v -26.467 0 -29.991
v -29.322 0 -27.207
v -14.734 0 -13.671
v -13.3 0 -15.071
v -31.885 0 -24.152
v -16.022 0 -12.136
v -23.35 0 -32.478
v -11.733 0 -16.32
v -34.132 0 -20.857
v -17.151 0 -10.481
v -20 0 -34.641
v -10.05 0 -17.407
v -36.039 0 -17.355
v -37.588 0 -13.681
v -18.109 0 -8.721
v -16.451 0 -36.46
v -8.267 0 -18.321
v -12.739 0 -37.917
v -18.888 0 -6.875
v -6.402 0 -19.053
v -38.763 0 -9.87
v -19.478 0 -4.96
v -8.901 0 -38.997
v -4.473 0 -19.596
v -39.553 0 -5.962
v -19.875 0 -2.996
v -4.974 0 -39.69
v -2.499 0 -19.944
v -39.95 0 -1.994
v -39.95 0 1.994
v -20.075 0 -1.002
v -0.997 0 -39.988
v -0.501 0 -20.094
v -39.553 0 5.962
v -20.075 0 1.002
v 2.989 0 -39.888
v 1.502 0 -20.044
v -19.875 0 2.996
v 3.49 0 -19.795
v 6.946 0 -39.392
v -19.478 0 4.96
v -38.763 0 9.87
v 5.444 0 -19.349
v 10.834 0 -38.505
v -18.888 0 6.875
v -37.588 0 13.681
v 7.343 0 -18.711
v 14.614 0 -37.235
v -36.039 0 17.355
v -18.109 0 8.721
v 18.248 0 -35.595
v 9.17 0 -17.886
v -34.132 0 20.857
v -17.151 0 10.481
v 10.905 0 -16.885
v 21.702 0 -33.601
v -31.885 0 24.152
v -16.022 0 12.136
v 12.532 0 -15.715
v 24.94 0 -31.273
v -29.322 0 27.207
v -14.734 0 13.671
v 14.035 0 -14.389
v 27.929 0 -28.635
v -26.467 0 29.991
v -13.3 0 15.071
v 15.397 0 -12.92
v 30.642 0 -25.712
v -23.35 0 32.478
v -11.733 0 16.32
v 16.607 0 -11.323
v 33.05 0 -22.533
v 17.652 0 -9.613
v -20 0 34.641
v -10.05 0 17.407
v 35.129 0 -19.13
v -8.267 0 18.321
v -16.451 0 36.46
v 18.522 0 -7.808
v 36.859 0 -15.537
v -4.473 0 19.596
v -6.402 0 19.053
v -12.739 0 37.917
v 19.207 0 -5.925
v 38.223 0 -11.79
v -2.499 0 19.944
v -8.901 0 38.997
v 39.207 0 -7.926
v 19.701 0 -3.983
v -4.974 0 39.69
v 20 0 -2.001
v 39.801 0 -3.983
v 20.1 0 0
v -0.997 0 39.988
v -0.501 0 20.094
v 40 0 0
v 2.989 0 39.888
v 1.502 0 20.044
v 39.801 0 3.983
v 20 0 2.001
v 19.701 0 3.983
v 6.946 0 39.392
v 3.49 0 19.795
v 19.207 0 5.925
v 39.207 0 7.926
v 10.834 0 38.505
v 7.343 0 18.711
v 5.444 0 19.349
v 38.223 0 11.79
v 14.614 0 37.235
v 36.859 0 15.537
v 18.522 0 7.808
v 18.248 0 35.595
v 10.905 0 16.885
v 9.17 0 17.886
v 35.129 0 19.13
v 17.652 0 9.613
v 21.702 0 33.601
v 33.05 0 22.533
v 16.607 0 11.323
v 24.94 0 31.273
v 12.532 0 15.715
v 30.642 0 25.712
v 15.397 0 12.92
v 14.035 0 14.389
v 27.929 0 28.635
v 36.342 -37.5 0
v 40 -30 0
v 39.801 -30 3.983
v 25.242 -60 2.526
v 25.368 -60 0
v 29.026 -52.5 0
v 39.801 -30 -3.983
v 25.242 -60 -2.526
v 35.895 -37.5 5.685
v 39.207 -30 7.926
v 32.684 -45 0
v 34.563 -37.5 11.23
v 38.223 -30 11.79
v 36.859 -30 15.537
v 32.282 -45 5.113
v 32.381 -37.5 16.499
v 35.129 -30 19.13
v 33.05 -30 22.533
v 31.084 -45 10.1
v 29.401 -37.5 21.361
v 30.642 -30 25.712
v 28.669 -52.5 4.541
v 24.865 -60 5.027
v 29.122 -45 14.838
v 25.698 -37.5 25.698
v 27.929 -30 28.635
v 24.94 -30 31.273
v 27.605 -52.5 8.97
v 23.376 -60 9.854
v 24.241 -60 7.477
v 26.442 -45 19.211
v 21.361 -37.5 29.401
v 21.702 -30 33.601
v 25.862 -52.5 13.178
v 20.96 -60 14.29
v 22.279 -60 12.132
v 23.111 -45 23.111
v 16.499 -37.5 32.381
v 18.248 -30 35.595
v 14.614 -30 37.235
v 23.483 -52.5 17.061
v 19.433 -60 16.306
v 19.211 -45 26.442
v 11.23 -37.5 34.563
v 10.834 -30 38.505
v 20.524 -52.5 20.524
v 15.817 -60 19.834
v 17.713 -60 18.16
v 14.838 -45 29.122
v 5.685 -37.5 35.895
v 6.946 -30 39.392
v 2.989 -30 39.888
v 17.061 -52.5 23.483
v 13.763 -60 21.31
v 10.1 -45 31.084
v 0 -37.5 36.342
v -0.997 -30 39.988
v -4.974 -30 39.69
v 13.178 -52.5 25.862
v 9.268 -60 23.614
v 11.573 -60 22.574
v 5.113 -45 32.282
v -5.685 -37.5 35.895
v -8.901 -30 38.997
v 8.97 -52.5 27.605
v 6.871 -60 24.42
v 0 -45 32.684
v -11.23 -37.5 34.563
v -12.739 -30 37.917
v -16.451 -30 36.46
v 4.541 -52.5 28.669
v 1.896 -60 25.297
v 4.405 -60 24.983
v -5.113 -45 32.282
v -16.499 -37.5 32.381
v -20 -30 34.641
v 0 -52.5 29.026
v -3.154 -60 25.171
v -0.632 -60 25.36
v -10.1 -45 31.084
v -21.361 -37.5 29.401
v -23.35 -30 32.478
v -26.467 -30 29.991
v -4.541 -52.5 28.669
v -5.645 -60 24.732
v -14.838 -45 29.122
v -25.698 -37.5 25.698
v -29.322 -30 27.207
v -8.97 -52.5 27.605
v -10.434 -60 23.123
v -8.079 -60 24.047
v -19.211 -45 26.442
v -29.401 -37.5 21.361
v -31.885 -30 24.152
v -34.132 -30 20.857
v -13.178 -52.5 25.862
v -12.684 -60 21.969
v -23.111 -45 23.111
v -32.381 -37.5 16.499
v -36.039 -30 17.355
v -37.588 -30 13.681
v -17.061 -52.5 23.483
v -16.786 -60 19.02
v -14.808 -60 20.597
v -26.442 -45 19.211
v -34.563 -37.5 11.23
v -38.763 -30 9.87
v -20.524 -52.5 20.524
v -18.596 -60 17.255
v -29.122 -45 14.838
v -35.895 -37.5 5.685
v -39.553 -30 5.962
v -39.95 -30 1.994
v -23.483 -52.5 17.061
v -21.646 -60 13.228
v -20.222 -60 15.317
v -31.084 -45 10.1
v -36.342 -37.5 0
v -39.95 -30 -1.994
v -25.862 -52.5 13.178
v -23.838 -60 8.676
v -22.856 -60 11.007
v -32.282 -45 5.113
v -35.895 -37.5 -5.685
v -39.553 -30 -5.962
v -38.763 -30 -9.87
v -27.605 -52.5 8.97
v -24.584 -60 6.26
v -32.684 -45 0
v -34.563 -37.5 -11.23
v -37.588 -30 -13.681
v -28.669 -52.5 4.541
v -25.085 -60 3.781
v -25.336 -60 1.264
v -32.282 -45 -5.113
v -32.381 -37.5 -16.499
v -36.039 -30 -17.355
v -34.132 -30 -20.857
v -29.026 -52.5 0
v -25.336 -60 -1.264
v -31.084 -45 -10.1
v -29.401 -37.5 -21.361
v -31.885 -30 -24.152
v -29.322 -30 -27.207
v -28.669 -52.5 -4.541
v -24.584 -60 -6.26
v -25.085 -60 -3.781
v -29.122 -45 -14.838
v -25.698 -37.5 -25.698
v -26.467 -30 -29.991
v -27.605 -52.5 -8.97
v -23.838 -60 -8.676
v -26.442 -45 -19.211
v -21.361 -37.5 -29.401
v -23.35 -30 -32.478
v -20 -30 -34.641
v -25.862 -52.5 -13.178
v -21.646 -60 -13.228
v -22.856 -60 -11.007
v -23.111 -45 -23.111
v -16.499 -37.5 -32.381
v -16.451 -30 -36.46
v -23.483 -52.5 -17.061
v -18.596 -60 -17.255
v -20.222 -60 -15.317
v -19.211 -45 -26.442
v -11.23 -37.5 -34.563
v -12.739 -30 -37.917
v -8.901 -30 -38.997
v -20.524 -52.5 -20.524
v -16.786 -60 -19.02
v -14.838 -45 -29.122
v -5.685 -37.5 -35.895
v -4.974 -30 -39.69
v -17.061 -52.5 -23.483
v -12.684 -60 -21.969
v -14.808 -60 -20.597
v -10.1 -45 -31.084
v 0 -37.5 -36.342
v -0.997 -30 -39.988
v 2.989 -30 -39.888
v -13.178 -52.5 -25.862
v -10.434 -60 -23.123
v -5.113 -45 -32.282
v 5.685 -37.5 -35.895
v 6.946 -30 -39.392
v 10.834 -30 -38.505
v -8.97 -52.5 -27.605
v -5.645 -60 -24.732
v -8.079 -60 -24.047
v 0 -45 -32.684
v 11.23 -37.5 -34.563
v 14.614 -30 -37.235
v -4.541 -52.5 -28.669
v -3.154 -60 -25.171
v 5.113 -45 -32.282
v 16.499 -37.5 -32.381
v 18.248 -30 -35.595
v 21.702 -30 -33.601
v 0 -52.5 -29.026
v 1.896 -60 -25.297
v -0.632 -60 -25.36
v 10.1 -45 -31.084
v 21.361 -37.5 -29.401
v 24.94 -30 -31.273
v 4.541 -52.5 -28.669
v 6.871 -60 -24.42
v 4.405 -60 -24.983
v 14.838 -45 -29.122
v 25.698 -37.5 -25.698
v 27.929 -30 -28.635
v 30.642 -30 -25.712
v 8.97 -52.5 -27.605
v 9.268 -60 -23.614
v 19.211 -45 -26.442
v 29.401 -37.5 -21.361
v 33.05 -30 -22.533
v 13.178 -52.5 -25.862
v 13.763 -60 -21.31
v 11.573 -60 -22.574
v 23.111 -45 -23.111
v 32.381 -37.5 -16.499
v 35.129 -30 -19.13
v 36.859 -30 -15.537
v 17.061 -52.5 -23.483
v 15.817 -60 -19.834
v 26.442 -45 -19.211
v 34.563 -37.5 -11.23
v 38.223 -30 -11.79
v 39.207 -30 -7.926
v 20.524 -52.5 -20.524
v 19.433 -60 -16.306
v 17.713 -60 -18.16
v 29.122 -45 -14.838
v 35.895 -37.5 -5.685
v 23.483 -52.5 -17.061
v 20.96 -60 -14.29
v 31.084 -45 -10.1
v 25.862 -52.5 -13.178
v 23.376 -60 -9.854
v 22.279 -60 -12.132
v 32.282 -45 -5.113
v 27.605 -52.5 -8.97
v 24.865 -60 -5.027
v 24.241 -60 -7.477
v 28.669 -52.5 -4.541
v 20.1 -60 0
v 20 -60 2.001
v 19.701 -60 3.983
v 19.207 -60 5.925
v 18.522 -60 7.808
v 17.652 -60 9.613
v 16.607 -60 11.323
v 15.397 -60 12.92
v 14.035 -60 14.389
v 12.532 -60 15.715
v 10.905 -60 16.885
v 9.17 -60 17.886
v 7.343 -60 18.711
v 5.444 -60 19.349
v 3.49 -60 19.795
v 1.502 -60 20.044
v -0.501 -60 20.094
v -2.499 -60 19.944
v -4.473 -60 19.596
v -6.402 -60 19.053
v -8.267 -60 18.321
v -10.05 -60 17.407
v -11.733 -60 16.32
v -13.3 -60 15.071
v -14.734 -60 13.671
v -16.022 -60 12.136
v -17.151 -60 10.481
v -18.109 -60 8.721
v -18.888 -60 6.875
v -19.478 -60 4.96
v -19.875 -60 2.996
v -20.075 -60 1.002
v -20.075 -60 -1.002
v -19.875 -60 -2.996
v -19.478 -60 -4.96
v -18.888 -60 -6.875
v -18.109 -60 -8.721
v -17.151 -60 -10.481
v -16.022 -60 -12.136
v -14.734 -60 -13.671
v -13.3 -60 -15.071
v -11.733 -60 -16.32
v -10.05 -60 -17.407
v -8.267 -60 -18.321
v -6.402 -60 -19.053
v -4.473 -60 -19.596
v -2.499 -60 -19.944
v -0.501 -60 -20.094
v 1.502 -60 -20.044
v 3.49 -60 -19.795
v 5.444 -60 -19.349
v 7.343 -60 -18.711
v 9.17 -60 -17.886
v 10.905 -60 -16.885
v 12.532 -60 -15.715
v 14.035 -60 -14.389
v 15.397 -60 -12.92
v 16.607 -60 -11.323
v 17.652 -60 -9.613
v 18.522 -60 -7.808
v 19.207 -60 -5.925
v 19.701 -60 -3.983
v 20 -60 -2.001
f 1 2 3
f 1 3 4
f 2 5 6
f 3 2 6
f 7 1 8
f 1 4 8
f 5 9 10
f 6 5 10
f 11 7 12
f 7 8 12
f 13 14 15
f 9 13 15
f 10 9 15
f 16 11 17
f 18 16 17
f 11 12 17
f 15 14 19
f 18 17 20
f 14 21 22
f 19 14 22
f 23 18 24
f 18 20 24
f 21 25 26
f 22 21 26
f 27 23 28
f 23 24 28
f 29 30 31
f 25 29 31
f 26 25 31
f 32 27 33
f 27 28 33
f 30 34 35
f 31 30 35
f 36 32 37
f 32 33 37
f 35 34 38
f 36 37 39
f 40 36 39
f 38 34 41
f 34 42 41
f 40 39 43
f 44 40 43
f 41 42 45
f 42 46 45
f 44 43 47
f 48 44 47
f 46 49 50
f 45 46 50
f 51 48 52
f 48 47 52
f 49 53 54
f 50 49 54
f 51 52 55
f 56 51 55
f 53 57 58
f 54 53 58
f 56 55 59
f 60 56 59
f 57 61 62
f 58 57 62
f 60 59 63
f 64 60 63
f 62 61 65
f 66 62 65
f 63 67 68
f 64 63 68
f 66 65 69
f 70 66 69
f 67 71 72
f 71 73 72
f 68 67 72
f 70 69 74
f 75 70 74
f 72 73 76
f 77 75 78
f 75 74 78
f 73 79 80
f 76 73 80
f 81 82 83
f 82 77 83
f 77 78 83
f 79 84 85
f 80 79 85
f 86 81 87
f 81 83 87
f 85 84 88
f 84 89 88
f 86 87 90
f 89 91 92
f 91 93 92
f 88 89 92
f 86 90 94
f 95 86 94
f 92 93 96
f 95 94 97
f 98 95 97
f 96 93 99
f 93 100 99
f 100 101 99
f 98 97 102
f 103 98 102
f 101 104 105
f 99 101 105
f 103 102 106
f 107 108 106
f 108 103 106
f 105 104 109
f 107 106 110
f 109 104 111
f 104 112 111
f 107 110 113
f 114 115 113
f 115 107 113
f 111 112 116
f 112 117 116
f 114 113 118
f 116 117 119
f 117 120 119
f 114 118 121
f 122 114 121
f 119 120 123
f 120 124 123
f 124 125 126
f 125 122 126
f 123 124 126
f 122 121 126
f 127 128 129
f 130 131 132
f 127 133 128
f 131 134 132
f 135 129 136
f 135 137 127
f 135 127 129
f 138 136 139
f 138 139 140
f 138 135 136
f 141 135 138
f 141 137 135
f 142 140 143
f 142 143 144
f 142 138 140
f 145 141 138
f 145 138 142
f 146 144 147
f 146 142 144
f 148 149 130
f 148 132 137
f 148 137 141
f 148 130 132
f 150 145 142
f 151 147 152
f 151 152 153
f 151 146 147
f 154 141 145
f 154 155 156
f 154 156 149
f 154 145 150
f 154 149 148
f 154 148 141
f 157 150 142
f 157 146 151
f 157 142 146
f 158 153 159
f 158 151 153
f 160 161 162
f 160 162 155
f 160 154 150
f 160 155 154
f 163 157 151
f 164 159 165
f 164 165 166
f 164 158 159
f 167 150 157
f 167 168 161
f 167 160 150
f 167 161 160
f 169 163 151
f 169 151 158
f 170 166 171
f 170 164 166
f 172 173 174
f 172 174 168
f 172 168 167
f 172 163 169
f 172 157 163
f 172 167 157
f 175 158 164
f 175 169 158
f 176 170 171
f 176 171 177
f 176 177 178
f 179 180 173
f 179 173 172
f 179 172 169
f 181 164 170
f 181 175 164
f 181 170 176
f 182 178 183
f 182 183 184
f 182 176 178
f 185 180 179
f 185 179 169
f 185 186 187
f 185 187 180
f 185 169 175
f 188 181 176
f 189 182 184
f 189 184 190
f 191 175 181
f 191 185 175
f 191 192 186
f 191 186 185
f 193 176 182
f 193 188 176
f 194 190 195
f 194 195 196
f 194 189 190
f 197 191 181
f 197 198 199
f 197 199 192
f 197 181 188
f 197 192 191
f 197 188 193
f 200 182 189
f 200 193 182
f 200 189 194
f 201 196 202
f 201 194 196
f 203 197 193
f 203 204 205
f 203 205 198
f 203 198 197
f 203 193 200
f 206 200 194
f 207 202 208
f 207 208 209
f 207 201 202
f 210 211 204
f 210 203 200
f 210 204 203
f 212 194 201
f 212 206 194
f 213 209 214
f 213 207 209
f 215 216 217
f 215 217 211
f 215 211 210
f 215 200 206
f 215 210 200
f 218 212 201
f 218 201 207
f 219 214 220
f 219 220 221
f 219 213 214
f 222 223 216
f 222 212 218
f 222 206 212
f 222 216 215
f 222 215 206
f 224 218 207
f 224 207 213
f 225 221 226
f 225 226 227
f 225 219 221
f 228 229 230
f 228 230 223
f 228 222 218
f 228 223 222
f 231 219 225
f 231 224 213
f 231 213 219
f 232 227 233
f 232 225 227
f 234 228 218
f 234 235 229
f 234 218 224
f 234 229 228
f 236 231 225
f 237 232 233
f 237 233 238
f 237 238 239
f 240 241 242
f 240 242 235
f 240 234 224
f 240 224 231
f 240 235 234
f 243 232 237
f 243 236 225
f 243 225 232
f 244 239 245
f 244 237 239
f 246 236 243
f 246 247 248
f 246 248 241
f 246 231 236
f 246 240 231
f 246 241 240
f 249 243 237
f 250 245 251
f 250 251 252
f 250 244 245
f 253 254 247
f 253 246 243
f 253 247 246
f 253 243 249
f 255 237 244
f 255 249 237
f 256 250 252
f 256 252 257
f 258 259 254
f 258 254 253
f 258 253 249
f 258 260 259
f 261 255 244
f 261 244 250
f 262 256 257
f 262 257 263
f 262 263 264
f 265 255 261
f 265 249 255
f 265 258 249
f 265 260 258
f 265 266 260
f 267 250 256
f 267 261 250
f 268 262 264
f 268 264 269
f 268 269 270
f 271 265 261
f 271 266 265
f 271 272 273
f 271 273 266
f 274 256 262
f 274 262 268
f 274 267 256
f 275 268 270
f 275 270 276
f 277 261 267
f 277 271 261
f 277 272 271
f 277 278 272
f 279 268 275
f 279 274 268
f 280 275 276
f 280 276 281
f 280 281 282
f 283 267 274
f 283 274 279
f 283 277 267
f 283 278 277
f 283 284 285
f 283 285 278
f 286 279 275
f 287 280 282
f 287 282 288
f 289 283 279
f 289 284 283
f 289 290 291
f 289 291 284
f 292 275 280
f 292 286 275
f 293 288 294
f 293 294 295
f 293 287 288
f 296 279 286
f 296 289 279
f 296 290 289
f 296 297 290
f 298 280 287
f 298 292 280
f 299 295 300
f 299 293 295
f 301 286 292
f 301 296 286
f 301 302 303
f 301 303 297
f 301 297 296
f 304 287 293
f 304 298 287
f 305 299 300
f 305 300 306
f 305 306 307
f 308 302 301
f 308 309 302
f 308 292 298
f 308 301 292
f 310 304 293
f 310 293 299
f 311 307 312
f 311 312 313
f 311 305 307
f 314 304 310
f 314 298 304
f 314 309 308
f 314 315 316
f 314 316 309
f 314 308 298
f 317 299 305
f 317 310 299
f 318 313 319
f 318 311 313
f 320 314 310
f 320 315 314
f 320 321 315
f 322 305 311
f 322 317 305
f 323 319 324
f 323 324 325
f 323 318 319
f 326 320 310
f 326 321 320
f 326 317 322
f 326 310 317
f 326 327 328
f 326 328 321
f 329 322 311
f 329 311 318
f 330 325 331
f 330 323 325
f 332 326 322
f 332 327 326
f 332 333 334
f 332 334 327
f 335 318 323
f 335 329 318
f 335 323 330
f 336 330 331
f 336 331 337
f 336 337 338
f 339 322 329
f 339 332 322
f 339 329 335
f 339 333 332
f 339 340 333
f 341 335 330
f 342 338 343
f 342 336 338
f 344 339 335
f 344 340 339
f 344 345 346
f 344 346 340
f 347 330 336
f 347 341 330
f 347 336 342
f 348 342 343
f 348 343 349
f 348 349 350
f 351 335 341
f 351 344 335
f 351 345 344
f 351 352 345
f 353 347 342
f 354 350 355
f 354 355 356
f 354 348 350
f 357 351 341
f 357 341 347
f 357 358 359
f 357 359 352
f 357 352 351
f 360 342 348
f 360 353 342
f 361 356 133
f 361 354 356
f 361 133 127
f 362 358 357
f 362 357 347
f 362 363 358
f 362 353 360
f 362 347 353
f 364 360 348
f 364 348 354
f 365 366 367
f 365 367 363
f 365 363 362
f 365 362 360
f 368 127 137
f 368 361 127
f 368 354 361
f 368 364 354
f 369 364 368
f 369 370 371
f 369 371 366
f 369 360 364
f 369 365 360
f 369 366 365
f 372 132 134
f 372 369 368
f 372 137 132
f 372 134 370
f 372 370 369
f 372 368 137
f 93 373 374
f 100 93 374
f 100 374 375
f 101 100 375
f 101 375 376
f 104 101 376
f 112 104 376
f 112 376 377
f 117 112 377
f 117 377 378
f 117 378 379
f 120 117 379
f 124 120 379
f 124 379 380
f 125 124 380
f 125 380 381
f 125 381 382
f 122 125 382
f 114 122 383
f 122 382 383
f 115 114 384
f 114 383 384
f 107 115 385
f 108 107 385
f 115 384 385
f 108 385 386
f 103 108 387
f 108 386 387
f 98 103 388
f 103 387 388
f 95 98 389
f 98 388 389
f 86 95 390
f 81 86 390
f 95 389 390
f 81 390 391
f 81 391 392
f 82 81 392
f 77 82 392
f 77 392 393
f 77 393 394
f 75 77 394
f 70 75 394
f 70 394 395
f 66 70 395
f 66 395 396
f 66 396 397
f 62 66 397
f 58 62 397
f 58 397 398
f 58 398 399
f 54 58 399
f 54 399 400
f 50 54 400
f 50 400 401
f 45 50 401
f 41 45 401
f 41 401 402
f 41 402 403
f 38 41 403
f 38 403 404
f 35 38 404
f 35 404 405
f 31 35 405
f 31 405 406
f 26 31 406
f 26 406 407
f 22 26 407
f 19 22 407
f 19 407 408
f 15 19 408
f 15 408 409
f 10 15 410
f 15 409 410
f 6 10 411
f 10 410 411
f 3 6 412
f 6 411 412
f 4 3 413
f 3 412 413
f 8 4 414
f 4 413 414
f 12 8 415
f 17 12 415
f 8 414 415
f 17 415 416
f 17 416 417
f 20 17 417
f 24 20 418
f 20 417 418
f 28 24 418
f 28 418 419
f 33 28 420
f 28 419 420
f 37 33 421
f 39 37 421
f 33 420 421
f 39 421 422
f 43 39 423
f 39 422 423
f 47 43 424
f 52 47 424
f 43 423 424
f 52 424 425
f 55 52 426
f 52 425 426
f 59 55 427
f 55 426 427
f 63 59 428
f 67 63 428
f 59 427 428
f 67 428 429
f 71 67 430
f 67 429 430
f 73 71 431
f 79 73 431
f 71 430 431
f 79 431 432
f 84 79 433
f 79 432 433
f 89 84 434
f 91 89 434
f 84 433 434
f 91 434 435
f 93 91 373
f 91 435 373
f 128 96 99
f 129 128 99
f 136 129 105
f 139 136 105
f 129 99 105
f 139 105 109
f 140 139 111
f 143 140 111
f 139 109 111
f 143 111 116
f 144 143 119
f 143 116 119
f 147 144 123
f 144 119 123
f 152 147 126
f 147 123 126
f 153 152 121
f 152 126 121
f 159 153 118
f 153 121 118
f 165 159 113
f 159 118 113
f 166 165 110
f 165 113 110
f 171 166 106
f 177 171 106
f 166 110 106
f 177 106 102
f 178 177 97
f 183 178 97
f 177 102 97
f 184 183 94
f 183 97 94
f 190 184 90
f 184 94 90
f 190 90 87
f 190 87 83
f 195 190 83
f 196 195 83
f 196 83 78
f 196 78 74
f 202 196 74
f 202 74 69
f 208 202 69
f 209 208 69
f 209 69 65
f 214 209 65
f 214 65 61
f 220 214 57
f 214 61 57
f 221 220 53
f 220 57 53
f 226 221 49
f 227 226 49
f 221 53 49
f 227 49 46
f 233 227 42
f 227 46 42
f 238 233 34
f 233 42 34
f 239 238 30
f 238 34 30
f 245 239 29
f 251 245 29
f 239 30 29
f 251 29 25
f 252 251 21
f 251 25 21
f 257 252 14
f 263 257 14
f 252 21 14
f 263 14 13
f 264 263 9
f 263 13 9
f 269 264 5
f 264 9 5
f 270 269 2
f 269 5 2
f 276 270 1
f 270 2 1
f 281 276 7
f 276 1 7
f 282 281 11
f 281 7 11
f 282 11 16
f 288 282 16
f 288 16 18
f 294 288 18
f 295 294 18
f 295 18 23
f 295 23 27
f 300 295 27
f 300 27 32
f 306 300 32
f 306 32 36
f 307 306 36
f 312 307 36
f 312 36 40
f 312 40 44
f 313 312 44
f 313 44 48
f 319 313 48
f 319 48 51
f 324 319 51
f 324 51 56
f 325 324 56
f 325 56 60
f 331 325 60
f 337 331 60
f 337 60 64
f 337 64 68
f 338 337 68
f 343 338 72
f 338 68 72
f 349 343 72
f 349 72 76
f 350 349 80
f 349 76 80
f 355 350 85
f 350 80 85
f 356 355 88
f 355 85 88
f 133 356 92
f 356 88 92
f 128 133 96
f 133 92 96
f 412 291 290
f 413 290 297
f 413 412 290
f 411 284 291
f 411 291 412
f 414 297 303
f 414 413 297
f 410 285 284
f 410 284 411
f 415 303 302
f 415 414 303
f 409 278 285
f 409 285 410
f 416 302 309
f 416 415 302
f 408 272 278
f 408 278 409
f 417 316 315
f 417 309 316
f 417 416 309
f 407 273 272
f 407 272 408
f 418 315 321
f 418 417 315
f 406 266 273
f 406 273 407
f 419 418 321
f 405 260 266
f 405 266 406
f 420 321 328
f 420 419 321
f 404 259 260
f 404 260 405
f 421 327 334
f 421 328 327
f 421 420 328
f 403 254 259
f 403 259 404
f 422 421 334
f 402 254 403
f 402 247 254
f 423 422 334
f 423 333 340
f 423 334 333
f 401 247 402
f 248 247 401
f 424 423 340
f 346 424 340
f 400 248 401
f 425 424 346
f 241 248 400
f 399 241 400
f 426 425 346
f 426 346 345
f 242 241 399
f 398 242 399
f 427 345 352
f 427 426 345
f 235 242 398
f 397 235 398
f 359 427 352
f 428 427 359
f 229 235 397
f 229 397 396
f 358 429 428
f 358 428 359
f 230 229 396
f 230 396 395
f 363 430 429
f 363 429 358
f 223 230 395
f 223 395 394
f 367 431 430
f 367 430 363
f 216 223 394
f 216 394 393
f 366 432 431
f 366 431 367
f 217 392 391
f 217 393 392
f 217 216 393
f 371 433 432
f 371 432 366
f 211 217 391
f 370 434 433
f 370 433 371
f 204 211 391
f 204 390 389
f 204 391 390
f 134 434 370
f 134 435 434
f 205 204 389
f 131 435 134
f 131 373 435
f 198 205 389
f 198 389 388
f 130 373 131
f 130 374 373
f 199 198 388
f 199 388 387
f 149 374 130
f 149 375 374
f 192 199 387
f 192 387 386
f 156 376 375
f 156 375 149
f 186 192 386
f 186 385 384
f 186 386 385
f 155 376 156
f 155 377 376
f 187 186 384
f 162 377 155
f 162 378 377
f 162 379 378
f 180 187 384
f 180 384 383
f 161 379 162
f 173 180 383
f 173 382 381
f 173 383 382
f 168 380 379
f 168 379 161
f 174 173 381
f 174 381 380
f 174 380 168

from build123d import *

# Parameters (mm, degrees)
F0_R      = 40
F1_DEPTH  = 30
F1_FACE_R = 40
F2_DEPTH  = 30
F2_TAPER  = 26
F3_R      = 20.1
F4_DEPTH  = 60.001


with BuildPart() as f1:
    # F0 (on Front) → F1 (new body)
    with BuildSketch(Plane.XZ):
        Circle(F0_R)
    extrude(amount=F1_DEPTH)

    # F1_face (on face) → F2 (join)
    with BuildSketch(Plane.XZ.offset(30)):
        Circle(F1_FACE_R)
    extrude(amount=F2_DEPTH, taper=F2_TAPER)

    # F3 (on face) → F4 (cut, through all)
    with BuildSketch(Plane.XZ.offset(60)):
        Circle(F3_R)
    extrude(amount=-F4_DEPTH, mode=Mode.SUBTRACT)


solid = f1.part
